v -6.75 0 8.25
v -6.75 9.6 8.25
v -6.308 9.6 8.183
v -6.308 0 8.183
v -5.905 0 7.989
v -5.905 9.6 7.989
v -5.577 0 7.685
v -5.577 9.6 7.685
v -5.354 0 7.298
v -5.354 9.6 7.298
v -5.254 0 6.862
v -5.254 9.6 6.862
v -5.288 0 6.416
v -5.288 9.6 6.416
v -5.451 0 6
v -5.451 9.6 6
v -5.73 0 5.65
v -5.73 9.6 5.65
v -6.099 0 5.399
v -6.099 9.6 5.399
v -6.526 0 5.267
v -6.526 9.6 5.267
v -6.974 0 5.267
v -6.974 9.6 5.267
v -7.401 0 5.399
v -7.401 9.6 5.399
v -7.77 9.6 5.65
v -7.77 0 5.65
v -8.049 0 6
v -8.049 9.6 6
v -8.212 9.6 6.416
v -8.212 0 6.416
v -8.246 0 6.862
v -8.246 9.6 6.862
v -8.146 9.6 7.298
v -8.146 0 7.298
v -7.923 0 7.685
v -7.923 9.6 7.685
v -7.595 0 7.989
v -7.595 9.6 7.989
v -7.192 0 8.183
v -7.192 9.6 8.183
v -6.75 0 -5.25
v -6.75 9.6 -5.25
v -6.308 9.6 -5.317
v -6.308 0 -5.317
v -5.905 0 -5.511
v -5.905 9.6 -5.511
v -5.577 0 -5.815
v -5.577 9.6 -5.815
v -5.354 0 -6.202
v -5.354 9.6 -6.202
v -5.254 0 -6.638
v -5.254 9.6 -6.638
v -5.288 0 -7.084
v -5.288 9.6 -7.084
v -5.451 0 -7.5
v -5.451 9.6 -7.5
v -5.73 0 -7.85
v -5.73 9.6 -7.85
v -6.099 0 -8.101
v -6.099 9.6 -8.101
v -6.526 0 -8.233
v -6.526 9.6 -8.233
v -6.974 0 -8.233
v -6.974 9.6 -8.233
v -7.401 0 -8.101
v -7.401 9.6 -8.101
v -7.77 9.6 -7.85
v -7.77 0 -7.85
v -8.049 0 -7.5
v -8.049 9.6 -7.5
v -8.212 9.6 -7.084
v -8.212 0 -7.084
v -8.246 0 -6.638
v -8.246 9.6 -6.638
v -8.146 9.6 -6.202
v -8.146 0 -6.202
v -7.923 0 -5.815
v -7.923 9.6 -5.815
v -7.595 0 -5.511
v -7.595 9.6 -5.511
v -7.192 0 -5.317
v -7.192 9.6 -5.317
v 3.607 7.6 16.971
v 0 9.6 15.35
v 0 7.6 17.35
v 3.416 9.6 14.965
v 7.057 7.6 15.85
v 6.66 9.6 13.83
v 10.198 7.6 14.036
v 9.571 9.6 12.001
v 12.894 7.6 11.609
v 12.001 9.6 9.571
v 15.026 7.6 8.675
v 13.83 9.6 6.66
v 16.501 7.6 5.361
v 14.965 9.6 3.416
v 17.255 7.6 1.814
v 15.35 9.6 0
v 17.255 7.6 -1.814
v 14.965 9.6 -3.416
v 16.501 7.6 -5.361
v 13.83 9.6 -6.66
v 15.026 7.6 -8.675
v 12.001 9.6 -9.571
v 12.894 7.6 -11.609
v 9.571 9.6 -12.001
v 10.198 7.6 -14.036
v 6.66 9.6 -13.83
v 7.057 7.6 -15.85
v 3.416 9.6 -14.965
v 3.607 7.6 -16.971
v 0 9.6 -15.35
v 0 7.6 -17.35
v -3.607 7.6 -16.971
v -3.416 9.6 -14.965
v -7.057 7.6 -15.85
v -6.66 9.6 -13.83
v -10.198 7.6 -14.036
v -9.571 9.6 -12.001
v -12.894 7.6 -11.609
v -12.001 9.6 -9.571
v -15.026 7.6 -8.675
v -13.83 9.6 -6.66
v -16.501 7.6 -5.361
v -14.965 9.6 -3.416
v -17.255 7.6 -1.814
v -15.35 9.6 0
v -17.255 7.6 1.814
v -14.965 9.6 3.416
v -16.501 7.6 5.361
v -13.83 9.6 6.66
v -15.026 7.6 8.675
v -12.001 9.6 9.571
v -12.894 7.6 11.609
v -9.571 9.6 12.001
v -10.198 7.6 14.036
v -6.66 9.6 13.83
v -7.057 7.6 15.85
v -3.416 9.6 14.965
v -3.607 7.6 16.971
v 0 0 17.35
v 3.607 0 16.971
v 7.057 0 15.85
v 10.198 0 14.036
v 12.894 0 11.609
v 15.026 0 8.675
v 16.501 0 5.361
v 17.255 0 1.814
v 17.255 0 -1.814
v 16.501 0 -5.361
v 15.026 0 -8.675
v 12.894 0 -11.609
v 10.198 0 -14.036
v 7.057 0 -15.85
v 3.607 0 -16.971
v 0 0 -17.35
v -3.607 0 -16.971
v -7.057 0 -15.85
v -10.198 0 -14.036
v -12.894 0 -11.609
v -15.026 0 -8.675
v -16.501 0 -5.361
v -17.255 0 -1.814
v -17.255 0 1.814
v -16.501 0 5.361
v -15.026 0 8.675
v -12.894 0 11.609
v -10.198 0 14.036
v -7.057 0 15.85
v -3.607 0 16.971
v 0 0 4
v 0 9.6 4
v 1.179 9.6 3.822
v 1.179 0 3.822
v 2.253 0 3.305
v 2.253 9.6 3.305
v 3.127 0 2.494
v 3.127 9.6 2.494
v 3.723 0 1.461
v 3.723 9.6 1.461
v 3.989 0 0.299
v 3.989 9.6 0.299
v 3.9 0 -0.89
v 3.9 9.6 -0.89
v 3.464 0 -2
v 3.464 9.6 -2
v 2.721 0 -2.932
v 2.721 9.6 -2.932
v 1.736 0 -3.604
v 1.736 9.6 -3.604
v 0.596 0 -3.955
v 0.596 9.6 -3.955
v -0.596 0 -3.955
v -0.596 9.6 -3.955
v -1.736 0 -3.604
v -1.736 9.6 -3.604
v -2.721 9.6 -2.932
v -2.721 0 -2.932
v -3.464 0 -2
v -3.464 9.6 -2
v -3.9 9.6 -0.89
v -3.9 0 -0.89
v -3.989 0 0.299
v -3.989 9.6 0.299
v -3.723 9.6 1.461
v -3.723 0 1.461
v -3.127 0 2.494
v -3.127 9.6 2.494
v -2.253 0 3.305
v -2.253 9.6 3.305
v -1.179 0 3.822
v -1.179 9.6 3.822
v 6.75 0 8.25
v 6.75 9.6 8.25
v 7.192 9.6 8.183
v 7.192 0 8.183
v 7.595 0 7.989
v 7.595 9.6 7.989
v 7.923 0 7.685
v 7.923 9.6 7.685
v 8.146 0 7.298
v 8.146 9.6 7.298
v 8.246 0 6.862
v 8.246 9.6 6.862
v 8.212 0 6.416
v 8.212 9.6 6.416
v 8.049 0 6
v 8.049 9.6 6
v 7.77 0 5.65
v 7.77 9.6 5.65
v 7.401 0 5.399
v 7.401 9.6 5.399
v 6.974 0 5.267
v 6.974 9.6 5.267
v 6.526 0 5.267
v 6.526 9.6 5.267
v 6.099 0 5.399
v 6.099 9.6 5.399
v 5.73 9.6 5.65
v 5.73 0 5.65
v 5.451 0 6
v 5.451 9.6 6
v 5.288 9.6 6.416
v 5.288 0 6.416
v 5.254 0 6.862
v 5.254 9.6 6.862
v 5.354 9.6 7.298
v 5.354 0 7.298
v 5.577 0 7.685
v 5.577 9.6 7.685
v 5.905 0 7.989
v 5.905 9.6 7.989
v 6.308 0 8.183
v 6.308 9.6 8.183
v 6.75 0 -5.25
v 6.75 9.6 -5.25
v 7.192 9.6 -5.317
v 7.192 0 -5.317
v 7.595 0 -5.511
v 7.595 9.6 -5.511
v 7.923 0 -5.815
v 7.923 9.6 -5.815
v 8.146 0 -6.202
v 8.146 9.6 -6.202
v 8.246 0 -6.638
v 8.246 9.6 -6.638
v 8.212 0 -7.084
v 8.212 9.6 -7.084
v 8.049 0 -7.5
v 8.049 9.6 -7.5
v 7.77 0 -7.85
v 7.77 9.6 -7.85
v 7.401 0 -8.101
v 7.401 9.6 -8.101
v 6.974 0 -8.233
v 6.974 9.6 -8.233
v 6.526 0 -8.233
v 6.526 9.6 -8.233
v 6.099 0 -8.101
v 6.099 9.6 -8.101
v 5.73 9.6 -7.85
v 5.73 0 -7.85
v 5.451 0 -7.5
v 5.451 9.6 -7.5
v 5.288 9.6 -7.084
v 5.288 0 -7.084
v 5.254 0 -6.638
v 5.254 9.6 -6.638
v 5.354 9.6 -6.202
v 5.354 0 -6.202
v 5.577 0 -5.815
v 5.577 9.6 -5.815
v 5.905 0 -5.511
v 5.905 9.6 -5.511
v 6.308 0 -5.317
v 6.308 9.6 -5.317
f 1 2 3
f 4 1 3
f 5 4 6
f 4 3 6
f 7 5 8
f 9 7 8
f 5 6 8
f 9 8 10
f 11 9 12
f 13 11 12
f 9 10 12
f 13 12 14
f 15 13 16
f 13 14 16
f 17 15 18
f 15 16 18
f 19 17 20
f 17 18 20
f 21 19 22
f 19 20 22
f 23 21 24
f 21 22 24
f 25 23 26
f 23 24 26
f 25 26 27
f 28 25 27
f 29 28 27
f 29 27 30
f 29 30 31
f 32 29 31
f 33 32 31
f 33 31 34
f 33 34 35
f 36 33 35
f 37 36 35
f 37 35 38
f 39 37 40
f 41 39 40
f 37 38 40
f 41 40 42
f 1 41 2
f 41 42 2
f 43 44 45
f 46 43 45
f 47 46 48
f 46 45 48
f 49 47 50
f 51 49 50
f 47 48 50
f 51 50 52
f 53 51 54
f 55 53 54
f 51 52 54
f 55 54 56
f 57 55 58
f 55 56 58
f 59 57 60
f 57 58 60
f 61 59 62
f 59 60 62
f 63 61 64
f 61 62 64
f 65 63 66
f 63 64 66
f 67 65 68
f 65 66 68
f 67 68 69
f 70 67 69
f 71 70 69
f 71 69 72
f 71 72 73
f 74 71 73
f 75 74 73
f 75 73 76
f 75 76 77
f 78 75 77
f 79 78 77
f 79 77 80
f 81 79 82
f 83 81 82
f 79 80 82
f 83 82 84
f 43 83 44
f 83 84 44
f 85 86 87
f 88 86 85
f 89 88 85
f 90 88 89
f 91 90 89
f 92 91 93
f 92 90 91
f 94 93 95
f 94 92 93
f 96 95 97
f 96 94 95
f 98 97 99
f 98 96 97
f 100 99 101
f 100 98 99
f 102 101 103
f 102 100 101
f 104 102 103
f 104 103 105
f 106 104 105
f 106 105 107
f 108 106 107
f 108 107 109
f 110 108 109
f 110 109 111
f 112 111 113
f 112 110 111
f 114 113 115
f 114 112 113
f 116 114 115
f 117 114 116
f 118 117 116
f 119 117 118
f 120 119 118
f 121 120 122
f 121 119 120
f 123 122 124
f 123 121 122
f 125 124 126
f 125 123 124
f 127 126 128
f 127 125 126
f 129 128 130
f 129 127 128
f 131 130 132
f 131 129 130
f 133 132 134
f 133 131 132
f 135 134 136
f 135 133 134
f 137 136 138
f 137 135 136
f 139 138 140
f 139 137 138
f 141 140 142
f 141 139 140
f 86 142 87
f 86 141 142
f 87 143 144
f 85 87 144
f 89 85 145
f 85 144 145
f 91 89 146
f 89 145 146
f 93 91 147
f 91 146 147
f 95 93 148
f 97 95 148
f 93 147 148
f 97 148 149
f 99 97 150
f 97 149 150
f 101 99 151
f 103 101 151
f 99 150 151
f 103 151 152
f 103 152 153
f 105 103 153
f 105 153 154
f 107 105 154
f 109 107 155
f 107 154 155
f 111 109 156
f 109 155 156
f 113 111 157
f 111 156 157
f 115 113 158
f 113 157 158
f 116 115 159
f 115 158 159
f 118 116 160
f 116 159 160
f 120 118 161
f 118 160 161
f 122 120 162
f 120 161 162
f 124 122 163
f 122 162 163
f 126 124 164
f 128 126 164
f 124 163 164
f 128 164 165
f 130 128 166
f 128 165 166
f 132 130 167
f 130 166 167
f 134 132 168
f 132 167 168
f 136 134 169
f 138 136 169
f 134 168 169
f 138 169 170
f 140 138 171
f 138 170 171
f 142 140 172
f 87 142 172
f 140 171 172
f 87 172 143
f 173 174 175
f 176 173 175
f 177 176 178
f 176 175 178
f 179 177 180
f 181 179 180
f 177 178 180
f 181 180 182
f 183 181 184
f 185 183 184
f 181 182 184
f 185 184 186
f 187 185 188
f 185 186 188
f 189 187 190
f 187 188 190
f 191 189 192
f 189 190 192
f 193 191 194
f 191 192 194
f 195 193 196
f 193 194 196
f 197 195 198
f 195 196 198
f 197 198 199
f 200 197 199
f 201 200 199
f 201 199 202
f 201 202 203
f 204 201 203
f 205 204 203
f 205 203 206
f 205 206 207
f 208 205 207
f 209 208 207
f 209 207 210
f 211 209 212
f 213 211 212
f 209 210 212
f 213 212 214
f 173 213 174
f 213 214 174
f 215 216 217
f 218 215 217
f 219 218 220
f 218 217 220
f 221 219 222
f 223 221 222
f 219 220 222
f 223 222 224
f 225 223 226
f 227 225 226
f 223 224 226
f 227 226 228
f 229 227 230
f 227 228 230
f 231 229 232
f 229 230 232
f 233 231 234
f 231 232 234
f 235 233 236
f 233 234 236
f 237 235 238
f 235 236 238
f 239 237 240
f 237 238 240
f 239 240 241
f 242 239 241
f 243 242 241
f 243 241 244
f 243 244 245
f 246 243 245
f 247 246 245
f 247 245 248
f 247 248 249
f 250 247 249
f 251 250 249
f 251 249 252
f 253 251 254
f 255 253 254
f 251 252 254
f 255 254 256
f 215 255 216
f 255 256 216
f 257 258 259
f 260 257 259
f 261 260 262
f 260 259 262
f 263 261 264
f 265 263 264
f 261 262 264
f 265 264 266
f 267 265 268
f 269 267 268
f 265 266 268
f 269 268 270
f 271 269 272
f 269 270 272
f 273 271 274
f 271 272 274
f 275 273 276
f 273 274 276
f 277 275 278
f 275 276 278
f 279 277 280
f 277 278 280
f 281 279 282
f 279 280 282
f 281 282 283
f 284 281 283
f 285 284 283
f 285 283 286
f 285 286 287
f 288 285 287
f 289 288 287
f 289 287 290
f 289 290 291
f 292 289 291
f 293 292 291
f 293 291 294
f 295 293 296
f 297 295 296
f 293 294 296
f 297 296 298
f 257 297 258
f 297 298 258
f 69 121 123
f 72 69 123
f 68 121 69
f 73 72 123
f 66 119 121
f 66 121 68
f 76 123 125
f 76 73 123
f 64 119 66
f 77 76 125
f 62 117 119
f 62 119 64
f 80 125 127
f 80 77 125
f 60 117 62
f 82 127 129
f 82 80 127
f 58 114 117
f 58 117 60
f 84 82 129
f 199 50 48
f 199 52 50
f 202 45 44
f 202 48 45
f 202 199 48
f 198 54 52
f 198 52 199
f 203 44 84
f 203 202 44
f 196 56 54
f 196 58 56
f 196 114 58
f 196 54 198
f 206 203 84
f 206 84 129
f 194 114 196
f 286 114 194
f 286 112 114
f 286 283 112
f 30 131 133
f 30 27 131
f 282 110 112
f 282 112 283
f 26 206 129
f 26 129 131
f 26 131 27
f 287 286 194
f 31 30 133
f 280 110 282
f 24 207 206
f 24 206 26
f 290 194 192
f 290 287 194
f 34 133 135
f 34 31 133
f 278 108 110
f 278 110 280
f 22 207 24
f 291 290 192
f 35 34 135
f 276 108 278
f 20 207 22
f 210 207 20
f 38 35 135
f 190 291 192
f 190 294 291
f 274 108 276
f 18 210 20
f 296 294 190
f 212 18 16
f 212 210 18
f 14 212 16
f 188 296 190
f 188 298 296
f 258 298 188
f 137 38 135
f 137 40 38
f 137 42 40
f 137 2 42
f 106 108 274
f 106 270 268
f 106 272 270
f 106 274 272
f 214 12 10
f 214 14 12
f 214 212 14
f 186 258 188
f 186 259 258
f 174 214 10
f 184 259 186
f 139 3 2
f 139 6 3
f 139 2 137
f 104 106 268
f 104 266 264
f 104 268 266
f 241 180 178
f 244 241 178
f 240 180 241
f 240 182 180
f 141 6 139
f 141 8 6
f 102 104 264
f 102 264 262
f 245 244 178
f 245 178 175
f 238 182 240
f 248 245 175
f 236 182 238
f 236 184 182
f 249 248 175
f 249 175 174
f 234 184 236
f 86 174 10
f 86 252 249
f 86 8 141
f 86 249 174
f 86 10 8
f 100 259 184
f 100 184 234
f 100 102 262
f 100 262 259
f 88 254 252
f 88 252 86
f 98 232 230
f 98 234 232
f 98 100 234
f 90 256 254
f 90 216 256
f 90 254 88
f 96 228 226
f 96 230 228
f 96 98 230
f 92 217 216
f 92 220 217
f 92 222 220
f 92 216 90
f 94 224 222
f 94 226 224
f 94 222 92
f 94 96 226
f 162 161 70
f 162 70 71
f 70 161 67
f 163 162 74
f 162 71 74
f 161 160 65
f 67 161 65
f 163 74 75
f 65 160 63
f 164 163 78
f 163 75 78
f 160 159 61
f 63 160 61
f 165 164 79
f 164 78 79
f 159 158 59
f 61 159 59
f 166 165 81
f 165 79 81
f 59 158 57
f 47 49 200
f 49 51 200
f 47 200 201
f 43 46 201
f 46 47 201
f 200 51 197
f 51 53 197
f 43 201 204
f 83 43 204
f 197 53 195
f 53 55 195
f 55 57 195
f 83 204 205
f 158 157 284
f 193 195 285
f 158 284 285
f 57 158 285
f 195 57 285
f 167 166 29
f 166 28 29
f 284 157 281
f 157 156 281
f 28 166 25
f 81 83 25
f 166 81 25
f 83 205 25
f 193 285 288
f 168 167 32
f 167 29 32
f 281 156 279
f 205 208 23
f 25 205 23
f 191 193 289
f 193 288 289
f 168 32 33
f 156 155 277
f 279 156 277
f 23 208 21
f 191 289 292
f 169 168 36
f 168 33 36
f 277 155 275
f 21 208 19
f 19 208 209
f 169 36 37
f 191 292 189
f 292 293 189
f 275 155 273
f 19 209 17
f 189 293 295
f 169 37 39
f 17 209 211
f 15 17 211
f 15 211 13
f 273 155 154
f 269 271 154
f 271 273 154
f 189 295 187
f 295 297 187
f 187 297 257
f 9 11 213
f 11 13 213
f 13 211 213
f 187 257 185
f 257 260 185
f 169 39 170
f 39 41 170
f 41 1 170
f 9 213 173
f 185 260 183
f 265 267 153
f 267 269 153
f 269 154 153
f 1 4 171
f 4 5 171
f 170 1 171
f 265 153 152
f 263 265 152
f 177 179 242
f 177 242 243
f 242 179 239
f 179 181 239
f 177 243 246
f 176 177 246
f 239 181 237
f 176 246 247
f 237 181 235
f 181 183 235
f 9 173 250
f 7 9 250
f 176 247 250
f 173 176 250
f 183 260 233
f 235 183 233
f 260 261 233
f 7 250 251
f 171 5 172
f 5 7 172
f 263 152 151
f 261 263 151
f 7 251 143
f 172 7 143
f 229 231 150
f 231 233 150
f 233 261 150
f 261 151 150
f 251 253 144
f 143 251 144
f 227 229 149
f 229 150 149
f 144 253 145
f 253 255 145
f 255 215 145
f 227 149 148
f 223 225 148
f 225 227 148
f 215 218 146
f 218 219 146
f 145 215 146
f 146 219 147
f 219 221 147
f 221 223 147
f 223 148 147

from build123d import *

# Parameters (mm, degrees)
SKETCH_1_R          = 17.35
EXTRUDE_1_DEPTH     = 9.6
CHAMFER_1_SIZE      = 2
SKETCH_2_R          = 4
SKETCH_2_R_2        = 1.5
CUT_EXTRUDE_1_DEPTH = 9.6


with BuildPart() as part:
    # 草图1 → 凸台-拉伸1 (new body)
    with BuildSketch(Plane(origin=(0, 0, 0), x_dir=(1, 0, 0), z_dir=(0, 1, 0))):
        with Locations(Location((0, 0, 0), (0, 0, 270))):
            Circle(SKETCH_1_R)
    extrude(amount=EXTRUDE_1_DEPTH)

    # 倒角1
    chamfer_1_edges = [part.edges().sort_by_distance(p)[0] for p in [
        (0, 9.6, -17.35),
    ]]
    chamfer(chamfer_1_edges, length=CHAMFER_1_SIZE)

    # 草图2 → 切除-拉伸1 (cut)
    with BuildSketch(Plane(origin=(0, 9.6, 0), x_dir=(1, 0, 0), z_dir=(0, 1, 0))):
        with Locations(Location((0, 0, 0), (0, 0, 270))):
            Circle(SKETCH_2_R)
        with Locations(Location((-6.75, 6.75, 0), (0, 0, 270))):
            Circle(SKETCH_2_R_2)
        with Locations(Location((6.75, 6.75, 0), (0, 0, 270))):
            Circle(SKETCH_2_R_2)
        with Locations(Location((6.75, -6.75, 0), (0, 0, 270))):
            Circle(SKETCH_2_R_2)
        with Locations(Location((-6.75, -6.75, 0), (0, 0, 270))):
            Circle(SKETCH_2_R_2)
    extrude(amount=-CUT_EXTRUDE_1_DEPTH, mode=Mode.SUBTRACT)


solid = part.part
